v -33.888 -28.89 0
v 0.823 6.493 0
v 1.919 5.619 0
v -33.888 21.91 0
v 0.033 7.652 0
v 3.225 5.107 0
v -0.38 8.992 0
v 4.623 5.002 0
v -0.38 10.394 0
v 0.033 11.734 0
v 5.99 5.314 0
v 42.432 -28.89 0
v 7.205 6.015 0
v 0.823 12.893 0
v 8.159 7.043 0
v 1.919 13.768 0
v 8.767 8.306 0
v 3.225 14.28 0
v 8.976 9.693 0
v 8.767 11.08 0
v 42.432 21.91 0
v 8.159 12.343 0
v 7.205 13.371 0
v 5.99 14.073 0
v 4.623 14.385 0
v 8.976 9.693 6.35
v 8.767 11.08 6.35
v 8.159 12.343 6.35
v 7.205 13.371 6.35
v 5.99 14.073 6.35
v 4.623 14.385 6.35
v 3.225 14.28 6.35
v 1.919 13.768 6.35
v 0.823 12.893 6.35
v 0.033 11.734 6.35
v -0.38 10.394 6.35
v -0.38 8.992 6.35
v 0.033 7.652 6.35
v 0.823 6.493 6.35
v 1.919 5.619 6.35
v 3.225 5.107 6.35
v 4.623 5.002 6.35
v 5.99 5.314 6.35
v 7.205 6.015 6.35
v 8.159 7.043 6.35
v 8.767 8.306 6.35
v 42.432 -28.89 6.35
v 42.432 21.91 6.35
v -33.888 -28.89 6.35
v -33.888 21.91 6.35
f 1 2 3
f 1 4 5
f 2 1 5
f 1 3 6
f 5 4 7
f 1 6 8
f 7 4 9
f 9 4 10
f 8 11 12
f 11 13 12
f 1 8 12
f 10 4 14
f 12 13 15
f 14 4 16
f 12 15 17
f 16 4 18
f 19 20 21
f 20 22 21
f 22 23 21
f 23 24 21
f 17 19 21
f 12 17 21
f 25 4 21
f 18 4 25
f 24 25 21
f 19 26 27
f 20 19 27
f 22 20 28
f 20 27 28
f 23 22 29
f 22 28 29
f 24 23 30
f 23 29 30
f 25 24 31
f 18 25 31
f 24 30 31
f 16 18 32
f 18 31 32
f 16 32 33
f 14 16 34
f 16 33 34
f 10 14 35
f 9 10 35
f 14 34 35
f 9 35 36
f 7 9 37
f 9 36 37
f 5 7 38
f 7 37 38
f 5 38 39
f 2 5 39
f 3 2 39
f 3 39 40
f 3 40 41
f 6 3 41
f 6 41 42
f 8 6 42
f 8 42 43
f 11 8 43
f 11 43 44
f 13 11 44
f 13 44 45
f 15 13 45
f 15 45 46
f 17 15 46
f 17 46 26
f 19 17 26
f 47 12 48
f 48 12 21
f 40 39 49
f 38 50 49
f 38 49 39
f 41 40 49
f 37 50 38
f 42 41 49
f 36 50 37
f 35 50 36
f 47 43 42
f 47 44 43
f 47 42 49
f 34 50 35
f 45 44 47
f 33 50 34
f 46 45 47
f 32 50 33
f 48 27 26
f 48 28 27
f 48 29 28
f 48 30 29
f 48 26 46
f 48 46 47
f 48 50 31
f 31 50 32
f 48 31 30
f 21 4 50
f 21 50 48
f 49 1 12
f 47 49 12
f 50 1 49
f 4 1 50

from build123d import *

# Parameters (mm, degrees)
F0_W          = 76.319962422
F0_H          = 50.8
F1_DEPTH      = 6.35
F2_R          = 4.7045967167
F3_DEPTH      = 99
F3_DEPTH_BACK = 6.351


# Not quite as in the source:
# - an extrude ends at something that could not be found from the text; its depth is read off the source's solid
# - a feature names something its author has since deleted; it is built from what else it names


with BuildPart() as f1:
    # F0 (on Top) → F1 (new body)
    with BuildSketch(Plane.XY):
        with Locations((4.271581769, -3.4901092946)):
            Rectangle(F0_W, F0_H)
    extrude(amount=F1_DEPTH)

    # F2 (on face) → F3 (cut, two sides)
    with BuildSketch(Plane.XY.offset(6.35)) as f3_sk:
        with Locations((4.271581769, 9.693203494)):
            Circle(F2_R)
    extrude(amount=F3_DEPTH, mode=Mode.SUBTRACT)
    extrude(f3_sk.sketch, amount=-F3_DEPTH_BACK, mode=Mode.SUBTRACT)


solid = f1.part
